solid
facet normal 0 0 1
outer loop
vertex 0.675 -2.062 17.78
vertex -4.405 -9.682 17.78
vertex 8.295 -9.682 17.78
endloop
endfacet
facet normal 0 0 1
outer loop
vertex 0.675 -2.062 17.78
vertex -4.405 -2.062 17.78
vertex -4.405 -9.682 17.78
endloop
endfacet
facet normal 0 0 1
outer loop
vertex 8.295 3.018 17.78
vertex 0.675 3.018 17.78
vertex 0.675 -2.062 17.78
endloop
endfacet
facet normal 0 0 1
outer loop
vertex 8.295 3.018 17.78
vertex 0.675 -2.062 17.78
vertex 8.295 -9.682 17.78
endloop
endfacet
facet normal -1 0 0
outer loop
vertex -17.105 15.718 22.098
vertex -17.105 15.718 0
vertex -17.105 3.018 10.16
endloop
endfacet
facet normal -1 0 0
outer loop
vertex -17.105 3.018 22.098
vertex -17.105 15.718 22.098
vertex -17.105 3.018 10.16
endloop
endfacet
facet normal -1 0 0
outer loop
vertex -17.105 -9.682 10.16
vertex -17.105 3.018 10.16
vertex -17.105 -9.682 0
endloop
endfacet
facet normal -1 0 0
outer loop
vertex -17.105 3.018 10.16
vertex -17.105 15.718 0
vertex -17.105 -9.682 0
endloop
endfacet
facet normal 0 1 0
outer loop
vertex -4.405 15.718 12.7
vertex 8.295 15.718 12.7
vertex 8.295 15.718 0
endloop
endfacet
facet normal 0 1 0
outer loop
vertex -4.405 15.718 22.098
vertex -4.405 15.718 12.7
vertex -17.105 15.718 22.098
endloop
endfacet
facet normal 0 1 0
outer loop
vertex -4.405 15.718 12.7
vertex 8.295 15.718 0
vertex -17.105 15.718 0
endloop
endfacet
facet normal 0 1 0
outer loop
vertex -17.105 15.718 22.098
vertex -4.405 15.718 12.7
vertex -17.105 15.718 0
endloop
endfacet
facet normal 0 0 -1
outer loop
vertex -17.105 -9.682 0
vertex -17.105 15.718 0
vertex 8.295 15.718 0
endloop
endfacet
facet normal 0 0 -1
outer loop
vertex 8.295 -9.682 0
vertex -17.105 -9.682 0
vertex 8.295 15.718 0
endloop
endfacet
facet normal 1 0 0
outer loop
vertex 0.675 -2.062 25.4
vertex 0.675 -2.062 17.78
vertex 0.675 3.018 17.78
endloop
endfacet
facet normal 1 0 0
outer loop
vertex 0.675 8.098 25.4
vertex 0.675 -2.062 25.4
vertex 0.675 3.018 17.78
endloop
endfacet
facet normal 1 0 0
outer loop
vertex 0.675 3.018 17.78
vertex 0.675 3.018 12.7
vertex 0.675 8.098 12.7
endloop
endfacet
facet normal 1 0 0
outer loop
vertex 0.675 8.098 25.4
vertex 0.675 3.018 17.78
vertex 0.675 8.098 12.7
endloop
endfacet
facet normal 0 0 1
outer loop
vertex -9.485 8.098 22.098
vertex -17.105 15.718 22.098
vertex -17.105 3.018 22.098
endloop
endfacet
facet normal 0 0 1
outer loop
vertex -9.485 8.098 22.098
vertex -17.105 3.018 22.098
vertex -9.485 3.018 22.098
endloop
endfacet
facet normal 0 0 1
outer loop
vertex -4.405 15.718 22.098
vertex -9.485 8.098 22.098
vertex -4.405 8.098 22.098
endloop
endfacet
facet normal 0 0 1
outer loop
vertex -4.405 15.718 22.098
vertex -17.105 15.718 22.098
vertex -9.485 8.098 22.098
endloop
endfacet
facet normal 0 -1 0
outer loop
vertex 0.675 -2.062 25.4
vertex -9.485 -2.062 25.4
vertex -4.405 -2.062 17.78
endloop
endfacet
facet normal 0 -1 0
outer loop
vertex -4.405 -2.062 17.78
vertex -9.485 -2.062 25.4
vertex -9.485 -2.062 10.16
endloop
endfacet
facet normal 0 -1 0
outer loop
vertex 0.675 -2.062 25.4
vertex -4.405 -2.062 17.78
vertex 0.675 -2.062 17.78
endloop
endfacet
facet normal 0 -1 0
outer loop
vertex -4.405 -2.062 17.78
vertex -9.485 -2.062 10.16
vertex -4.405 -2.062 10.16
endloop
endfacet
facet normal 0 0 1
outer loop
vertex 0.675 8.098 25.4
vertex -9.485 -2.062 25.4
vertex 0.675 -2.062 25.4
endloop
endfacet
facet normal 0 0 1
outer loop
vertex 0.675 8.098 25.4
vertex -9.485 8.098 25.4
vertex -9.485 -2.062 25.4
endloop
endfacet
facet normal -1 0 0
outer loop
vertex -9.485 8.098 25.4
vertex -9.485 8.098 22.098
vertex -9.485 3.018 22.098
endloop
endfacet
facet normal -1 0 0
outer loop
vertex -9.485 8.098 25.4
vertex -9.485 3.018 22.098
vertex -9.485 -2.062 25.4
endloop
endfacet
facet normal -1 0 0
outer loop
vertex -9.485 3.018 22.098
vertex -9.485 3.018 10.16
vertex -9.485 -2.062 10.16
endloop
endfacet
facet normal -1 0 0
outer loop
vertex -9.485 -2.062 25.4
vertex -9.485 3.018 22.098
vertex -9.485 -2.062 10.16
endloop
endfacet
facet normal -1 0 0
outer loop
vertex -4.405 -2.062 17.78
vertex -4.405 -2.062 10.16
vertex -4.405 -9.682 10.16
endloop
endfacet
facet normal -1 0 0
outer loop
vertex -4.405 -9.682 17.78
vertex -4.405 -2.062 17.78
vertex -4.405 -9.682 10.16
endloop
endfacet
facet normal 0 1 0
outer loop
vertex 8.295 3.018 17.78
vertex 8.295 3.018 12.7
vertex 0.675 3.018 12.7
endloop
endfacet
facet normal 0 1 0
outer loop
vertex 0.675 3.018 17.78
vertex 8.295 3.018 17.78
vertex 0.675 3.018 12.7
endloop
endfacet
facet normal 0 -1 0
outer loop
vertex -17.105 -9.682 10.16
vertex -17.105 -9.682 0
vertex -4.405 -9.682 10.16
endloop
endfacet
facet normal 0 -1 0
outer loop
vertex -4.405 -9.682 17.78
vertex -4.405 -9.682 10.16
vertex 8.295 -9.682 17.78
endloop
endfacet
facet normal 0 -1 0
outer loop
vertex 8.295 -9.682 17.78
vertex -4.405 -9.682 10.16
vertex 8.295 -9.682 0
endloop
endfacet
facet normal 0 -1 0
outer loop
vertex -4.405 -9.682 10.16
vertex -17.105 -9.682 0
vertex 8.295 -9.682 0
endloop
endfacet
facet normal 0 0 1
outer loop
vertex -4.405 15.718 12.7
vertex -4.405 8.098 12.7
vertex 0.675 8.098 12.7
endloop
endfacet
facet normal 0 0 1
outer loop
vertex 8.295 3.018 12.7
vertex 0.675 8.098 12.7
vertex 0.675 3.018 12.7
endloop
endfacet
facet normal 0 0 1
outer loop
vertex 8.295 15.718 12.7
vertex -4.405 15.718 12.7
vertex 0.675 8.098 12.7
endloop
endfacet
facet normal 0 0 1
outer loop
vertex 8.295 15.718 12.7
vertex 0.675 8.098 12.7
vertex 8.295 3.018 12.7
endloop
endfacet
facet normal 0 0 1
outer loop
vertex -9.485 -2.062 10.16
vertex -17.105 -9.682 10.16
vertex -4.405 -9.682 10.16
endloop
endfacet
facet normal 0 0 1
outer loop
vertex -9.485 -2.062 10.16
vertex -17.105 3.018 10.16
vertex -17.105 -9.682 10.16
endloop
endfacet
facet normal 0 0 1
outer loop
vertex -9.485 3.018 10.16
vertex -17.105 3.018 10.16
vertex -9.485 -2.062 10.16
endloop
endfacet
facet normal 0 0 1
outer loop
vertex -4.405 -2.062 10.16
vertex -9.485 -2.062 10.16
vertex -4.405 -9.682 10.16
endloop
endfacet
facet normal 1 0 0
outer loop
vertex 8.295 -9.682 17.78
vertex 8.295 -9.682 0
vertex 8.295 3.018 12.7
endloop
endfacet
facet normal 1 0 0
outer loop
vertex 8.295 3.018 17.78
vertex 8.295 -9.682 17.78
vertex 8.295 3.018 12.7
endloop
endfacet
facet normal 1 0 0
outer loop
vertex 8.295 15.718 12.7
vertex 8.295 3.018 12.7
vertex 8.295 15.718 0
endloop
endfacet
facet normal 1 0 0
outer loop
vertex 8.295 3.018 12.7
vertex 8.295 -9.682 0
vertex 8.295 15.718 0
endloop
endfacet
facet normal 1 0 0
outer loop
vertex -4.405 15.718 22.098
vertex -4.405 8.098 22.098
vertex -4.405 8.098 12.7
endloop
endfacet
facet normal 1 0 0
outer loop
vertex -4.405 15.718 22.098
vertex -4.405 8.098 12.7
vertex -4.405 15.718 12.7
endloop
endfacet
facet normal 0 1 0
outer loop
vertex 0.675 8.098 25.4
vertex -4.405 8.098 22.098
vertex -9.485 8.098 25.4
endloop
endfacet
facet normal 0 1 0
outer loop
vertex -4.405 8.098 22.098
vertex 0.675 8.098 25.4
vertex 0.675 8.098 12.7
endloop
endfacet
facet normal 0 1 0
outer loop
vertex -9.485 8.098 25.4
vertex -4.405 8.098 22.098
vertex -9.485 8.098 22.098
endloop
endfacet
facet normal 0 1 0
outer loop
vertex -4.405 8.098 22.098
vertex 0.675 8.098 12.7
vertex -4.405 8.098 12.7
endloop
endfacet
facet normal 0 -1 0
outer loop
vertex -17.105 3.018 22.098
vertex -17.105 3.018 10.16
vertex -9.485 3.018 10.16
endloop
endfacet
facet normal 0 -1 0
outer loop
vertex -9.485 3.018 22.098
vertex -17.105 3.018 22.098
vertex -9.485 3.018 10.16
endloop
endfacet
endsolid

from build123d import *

# Parameters (mm, degrees)
F1_DEPTH = 22.098
F2_DEPTH = 12.7
F3_DEPTH = 10.16
F4_DEPTH = 17.78
F5_DEPTH = 25.4


with BuildPart() as f1:
    # F0 (on Top) → F1 (new body)
    with BuildSketch(Plane.XY):
        Polygon((-4.405003, 8.097968), (-4.405003, 15.717968), (-17.105003, 15.717968), (-17.105003, 3.017968), (-9.622183, 3.017968), (-9.485003, 3.017968), (-9.485003, 8.097968), align=None)
    extrude(amount=F1_DEPTH)

    # F0 (on Top) → F2 (join)
    with BuildSketch(Plane.XY):
        Polygon((0.674997, 3.017968), (8.294997, 3.017968), (8.294997, 15.717968), (-4.405003, 15.717968), (-4.405003, 8.097968), (0.674997, 8.097968), align=None)
    extrude(amount=F2_DEPTH)

    # F0 (on Top) → F3 (join)
    with BuildSketch(Plane.XY):
        Polygon((-17.105003, -9.682032), (-4.405003, -9.682032), (-4.405003, -2.062032), (-9.485003, -2.062032), (-9.485003, 3.017968), (-9.622183, 3.017968), (-17.105003, 3.017968), (-17.105003, -3.333643), align=None)
    extrude(amount=F3_DEPTH)

    # F0 (on Top) → F4 (join)
    with BuildSketch(Plane.XY):
        Polygon((-4.405003, -9.682032), (8.294997, -9.682032), (8.294997, 3.017968), (0.674997, 3.017968), (0.674997, -2.062032), (-4.405003, -2.062032), align=None)
    extrude(amount=F4_DEPTH)

    # F0 (on Top) → F5 (join)
    with BuildSketch(Plane.XY):
        Polygon((-9.485003, -2.062032), (-4.405003, -2.062032), (0.674997, -2.062032), (0.674997, 3.017968), (0.674997, 8.097968), (-4.405003, 8.097968), (-9.485003, 8.097968), (-9.485003, 3.017968), align=None)
    extrude(amount=F5_DEPTH)


solid = f1.part
